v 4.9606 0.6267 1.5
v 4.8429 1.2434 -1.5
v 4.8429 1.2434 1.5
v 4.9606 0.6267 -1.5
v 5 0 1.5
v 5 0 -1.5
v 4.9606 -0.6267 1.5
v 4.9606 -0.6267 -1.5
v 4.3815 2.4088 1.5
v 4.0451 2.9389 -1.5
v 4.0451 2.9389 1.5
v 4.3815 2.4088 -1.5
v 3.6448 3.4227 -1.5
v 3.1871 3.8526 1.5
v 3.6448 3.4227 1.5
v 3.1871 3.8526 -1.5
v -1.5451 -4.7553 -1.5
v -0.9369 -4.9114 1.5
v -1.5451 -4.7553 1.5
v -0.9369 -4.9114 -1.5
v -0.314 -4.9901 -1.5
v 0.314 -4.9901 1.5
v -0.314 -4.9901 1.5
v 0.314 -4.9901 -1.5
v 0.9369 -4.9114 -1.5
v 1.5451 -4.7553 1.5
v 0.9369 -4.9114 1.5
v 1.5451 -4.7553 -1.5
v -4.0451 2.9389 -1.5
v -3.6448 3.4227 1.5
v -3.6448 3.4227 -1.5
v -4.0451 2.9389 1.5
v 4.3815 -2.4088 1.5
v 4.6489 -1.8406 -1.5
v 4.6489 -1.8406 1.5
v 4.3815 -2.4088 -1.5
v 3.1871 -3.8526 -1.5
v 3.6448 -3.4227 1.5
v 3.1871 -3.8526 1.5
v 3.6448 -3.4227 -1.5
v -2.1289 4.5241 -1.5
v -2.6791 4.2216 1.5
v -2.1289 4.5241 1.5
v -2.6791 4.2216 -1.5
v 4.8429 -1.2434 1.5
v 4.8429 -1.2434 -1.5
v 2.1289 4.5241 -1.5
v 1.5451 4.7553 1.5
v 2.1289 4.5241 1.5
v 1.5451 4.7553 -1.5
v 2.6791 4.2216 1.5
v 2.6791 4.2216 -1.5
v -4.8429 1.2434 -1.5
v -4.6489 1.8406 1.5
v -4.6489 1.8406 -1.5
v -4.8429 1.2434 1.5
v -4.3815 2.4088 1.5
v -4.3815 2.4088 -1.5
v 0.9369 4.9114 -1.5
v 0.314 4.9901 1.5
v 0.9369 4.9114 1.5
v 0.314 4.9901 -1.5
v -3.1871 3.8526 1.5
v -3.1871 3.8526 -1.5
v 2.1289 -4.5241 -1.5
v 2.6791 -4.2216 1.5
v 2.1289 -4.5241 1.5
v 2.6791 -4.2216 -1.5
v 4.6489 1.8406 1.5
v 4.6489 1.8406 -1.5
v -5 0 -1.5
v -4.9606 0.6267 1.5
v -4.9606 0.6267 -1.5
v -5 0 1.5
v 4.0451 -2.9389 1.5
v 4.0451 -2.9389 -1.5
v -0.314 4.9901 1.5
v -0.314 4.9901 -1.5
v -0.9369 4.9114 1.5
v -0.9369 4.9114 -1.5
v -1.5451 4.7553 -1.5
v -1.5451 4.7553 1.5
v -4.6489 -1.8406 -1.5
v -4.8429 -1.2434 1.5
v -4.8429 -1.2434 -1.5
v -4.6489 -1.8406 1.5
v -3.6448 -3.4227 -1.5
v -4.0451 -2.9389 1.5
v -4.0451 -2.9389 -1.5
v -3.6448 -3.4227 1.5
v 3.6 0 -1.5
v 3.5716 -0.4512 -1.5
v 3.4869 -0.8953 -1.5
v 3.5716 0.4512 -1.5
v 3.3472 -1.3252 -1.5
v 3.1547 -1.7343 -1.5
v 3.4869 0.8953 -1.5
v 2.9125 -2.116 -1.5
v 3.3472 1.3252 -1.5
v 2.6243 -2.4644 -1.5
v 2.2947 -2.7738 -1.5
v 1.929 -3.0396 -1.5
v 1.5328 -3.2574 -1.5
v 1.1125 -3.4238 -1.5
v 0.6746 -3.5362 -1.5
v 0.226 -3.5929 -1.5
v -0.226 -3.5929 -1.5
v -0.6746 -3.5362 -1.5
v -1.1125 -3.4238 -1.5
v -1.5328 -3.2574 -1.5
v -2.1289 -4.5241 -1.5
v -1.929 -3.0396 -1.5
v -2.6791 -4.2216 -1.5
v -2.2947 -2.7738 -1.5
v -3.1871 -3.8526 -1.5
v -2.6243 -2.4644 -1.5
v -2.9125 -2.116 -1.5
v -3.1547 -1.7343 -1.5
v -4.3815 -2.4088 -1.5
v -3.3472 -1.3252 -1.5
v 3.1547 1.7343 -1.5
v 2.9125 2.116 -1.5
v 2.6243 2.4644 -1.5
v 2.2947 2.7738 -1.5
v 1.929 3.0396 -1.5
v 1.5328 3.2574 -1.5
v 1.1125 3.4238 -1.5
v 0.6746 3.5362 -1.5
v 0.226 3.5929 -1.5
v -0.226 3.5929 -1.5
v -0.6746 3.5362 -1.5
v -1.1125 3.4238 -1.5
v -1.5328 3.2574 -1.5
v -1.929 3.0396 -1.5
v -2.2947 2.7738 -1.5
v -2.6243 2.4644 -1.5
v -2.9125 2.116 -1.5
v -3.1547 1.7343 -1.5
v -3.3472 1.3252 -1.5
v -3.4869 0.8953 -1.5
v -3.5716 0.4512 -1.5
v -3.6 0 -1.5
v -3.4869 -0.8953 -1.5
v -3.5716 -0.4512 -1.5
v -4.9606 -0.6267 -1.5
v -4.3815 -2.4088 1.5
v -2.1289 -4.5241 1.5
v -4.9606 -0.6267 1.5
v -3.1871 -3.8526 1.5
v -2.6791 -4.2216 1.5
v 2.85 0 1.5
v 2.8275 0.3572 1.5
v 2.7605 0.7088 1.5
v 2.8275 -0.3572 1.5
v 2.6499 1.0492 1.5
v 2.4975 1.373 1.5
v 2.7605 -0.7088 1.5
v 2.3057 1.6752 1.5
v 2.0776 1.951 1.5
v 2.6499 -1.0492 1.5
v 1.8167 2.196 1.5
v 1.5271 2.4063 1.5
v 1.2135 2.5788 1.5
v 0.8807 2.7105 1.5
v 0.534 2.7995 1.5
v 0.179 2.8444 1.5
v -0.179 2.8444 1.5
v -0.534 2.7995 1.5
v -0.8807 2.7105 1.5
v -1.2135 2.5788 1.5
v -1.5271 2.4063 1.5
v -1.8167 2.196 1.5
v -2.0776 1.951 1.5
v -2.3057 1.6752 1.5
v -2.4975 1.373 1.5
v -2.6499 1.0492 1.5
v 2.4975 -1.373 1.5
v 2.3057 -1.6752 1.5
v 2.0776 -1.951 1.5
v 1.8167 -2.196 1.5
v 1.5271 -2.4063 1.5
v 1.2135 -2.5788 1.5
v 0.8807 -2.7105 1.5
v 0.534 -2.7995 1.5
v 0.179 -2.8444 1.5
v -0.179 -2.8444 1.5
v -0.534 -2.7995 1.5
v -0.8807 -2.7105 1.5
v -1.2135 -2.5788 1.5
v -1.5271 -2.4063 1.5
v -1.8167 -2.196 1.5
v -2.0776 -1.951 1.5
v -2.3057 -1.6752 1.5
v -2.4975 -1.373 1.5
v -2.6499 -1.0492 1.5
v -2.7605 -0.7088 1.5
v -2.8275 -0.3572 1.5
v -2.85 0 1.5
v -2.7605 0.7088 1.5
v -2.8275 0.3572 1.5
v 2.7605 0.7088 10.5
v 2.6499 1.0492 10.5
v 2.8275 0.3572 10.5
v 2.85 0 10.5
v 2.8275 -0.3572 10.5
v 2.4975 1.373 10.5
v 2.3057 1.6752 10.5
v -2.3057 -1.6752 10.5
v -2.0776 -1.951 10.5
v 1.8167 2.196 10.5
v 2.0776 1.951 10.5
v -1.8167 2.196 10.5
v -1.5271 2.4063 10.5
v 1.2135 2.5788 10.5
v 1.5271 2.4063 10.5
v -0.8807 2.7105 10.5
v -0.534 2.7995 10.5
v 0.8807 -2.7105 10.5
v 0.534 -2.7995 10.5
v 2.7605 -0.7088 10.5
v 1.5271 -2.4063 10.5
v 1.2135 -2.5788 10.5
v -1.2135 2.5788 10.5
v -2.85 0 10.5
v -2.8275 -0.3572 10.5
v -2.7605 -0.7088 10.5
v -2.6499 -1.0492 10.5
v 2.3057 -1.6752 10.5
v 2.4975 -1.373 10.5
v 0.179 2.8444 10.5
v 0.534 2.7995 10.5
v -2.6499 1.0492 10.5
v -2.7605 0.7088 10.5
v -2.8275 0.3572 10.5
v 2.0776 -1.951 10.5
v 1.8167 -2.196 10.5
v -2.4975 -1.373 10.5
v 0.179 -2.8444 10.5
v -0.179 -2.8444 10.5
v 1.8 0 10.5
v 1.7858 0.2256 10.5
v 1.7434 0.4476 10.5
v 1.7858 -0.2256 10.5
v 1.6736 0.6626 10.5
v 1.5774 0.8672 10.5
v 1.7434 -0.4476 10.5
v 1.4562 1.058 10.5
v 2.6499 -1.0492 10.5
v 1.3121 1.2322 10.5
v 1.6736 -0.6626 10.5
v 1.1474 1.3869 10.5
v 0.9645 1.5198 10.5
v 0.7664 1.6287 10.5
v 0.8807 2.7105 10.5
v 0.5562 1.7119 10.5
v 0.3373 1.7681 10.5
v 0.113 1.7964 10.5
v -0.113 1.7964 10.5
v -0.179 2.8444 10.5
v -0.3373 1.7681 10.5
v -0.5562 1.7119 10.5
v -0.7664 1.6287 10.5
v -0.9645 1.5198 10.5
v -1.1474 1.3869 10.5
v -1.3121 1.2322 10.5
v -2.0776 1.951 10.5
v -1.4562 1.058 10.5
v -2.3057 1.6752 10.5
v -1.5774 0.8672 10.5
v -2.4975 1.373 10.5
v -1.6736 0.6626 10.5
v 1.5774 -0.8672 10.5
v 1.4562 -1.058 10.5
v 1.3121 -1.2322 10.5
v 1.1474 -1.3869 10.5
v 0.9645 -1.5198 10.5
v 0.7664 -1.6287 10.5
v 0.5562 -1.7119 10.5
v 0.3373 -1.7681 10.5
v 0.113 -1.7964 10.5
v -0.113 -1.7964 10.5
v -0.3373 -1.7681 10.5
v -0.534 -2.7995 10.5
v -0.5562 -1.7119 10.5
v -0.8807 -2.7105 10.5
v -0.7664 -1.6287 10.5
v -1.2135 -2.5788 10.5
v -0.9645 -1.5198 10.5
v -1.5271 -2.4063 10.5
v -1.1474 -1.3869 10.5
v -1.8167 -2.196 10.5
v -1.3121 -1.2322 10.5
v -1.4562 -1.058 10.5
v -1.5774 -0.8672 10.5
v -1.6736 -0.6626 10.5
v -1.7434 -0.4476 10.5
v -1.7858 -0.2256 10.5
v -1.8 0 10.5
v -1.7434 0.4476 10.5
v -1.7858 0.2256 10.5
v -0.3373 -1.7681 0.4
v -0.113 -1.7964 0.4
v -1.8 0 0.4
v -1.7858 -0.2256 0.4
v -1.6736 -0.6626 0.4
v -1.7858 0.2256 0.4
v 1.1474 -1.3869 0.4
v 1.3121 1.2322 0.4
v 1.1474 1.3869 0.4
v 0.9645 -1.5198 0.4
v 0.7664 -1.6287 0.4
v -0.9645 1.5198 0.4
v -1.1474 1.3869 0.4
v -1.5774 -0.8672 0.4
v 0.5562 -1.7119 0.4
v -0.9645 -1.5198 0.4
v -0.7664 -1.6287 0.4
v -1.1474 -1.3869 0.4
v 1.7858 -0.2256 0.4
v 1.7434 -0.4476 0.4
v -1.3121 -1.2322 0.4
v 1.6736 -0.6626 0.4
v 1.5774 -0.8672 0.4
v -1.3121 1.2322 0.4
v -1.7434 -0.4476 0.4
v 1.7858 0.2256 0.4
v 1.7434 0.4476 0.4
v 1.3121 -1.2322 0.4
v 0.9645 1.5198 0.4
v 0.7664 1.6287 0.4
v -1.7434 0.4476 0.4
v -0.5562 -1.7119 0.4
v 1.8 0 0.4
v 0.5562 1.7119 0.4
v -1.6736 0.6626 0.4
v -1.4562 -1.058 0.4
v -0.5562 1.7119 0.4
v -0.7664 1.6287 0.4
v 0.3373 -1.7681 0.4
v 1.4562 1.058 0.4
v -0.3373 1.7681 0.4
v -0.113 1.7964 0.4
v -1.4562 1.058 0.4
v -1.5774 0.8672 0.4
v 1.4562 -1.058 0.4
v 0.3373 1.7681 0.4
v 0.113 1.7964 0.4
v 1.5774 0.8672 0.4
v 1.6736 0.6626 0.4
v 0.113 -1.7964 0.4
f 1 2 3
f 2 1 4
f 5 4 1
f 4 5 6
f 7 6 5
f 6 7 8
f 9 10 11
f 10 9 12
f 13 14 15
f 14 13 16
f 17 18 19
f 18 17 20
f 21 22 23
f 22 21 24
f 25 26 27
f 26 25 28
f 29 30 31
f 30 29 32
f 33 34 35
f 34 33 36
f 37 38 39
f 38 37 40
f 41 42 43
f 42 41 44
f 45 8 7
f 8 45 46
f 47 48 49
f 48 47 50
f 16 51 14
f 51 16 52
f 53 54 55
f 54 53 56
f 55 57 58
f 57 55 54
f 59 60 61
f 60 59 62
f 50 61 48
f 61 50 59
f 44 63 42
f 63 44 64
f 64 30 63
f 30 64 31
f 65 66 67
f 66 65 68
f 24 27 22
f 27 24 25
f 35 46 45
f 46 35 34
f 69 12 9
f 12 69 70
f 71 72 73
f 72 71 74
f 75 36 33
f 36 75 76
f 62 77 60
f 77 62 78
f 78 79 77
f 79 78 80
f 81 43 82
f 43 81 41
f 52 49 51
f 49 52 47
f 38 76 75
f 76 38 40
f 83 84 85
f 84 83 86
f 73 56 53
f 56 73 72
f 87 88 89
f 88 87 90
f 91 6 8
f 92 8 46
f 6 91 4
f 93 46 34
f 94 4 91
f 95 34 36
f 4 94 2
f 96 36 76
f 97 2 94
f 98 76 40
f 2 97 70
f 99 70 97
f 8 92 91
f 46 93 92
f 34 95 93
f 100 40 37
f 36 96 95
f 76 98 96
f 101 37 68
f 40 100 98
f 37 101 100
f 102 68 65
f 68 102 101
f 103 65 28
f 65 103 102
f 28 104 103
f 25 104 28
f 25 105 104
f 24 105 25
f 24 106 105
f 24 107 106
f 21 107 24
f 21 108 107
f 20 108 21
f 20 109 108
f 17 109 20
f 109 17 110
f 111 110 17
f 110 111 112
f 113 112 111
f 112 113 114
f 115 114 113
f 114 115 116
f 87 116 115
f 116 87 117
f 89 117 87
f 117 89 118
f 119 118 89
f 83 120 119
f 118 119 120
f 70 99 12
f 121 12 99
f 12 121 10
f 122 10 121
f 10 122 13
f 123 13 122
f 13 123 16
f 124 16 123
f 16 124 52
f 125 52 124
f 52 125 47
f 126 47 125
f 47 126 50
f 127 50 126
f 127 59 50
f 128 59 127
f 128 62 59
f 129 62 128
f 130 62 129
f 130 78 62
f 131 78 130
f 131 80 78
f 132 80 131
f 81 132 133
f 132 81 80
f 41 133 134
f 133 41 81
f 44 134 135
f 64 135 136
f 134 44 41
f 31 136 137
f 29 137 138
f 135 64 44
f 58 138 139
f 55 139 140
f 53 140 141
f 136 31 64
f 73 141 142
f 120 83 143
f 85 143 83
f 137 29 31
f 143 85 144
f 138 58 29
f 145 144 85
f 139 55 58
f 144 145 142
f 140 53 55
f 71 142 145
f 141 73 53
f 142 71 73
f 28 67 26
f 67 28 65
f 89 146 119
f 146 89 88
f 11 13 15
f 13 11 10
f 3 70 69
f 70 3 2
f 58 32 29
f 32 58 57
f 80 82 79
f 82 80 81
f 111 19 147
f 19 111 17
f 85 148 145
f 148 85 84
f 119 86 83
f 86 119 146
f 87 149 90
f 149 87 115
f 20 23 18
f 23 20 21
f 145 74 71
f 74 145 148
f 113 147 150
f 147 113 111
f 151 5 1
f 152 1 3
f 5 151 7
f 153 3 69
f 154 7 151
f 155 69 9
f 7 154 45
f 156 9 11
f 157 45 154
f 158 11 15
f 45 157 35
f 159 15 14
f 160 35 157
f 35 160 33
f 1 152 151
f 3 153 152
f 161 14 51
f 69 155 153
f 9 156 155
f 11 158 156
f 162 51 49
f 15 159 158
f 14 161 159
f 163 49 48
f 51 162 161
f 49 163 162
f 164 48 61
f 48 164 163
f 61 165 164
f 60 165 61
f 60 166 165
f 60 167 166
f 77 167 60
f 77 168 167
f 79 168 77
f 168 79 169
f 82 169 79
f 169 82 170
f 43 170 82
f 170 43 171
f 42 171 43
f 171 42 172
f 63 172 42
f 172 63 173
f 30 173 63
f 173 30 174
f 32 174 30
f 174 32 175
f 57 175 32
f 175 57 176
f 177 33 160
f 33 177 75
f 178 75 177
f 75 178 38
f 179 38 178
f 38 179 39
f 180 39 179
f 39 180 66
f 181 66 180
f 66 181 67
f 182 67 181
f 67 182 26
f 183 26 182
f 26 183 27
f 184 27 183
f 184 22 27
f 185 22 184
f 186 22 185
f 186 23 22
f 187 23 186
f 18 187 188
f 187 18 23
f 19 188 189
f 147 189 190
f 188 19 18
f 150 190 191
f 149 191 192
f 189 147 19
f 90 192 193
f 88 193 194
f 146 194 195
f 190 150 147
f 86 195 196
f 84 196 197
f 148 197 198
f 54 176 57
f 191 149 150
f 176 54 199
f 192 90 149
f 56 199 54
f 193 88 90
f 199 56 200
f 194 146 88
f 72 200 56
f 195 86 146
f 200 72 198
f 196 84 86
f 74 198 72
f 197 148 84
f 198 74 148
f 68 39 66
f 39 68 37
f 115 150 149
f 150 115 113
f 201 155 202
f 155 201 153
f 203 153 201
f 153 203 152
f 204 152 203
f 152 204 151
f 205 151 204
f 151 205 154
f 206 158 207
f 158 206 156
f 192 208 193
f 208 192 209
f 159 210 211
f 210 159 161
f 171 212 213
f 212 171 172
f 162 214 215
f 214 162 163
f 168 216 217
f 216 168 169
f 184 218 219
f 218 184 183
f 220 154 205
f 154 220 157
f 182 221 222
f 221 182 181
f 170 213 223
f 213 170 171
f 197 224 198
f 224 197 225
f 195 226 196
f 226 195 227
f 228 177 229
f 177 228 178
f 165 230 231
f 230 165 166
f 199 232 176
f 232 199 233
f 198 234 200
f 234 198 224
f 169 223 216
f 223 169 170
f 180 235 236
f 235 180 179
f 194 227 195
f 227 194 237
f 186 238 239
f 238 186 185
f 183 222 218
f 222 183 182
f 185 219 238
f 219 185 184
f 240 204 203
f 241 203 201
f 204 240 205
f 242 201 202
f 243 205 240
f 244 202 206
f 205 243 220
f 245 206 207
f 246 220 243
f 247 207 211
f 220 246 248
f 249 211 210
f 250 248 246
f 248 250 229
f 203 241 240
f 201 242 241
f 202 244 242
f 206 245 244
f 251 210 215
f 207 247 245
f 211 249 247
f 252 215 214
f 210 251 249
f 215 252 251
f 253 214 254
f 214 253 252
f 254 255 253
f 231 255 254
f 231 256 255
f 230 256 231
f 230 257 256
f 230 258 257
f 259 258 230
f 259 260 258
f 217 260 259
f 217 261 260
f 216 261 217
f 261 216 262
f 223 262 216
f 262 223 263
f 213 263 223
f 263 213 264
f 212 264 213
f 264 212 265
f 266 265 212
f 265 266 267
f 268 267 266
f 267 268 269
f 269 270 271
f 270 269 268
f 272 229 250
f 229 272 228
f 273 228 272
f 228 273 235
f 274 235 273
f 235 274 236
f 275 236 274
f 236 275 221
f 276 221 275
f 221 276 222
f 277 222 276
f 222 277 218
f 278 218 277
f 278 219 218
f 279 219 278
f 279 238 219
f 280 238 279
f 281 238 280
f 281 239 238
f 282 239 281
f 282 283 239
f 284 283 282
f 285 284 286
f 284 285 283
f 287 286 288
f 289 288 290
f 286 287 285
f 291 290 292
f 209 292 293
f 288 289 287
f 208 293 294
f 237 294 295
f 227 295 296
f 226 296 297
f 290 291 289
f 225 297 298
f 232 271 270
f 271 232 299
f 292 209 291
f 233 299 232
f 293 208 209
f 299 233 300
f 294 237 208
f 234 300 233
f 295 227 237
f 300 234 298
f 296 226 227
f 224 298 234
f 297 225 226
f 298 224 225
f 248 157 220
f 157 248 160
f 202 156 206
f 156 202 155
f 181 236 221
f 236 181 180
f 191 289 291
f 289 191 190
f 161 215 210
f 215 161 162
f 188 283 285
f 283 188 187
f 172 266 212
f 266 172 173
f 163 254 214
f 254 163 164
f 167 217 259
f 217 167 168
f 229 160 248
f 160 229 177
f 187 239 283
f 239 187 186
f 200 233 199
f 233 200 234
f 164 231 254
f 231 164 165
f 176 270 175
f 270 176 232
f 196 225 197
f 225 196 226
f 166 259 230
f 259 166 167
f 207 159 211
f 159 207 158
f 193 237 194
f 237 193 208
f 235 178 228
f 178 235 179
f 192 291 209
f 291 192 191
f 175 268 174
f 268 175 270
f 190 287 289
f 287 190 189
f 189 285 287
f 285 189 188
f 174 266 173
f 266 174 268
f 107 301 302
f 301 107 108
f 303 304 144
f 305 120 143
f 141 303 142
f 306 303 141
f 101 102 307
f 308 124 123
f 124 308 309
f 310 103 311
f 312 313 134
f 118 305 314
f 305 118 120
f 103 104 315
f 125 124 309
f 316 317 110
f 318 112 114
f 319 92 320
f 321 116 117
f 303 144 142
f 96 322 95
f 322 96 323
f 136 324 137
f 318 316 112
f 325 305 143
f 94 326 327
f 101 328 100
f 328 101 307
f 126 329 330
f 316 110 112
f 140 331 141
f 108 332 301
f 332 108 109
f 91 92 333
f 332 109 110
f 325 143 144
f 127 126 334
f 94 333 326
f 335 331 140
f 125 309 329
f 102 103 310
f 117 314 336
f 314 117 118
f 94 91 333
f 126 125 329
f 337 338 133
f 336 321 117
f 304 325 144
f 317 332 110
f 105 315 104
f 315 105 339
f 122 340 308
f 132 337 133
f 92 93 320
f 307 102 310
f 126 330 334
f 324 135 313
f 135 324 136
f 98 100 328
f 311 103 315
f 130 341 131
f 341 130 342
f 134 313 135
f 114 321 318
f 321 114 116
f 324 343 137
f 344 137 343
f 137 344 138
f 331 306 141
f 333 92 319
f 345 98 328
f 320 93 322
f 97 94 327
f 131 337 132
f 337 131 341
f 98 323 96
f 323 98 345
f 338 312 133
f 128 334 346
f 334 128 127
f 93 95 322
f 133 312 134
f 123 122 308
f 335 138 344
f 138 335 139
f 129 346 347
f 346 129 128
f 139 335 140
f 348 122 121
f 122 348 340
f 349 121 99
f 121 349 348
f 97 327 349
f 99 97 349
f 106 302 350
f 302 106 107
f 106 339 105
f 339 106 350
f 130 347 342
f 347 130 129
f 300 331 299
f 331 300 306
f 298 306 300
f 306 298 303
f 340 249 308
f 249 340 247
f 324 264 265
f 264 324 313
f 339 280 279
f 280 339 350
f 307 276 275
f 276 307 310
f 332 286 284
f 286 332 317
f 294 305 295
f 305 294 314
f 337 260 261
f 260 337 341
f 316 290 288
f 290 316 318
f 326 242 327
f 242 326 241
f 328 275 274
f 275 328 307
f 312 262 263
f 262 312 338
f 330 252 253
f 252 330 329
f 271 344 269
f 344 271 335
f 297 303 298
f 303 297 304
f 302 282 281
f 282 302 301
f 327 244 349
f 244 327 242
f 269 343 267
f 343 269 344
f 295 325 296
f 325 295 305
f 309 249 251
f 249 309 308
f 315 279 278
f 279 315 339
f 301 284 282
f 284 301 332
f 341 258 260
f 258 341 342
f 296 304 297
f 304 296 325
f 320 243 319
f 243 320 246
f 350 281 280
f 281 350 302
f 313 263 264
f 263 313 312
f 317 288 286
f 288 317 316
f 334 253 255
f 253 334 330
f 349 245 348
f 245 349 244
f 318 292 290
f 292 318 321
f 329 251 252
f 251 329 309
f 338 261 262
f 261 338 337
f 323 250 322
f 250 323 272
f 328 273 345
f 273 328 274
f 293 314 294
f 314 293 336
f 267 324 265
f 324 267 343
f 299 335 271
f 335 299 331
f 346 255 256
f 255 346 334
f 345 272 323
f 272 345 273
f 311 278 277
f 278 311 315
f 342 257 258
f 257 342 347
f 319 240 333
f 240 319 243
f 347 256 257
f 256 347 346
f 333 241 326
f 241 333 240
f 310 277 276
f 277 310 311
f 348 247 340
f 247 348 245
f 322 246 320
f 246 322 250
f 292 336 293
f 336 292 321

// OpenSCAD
$fn = 50;


difference() {
	union() {
		translate(v = [0, 0, -1.5000000000]) {
			cylinder(h = 3, r = 5.0000000000);
		}
		translate(v = [0, 0, -1.5000000000]) {
			cylinder(h = 12, r = 2.8500000000);
		}
	}
	union() {
		translate(v = [0, 0, -1.5000000000]) {
			rotate(a = [0, 180, 0]) {
				difference() {
					union() {
						translate(v = [0, 0, -12.0000000000]) {
							cylinder(h = 12, r = 1.5000000000);
						}
						translate(v = [0, 0, -1.9000000000]) {
							cylinder(h = 1.9000000000, r1 = 1.8000000000, r2 = 3.6000000000);
						}
						translate(v = [0, 0, -12.0000000000]) {
							cylinder(h = 12, r = 1.8000000000);
						}
						translate(v = [0, 0, -12.0000000000]) {
							cylinder(h = 12, r = 1.5000000000);
						}
					}
					union();
				}
			}
		}
		translate(v = [0, 0, -100.0000000000]) {
			cylinder(h = 200, r = 1.8000000000);
		}
	}
}
